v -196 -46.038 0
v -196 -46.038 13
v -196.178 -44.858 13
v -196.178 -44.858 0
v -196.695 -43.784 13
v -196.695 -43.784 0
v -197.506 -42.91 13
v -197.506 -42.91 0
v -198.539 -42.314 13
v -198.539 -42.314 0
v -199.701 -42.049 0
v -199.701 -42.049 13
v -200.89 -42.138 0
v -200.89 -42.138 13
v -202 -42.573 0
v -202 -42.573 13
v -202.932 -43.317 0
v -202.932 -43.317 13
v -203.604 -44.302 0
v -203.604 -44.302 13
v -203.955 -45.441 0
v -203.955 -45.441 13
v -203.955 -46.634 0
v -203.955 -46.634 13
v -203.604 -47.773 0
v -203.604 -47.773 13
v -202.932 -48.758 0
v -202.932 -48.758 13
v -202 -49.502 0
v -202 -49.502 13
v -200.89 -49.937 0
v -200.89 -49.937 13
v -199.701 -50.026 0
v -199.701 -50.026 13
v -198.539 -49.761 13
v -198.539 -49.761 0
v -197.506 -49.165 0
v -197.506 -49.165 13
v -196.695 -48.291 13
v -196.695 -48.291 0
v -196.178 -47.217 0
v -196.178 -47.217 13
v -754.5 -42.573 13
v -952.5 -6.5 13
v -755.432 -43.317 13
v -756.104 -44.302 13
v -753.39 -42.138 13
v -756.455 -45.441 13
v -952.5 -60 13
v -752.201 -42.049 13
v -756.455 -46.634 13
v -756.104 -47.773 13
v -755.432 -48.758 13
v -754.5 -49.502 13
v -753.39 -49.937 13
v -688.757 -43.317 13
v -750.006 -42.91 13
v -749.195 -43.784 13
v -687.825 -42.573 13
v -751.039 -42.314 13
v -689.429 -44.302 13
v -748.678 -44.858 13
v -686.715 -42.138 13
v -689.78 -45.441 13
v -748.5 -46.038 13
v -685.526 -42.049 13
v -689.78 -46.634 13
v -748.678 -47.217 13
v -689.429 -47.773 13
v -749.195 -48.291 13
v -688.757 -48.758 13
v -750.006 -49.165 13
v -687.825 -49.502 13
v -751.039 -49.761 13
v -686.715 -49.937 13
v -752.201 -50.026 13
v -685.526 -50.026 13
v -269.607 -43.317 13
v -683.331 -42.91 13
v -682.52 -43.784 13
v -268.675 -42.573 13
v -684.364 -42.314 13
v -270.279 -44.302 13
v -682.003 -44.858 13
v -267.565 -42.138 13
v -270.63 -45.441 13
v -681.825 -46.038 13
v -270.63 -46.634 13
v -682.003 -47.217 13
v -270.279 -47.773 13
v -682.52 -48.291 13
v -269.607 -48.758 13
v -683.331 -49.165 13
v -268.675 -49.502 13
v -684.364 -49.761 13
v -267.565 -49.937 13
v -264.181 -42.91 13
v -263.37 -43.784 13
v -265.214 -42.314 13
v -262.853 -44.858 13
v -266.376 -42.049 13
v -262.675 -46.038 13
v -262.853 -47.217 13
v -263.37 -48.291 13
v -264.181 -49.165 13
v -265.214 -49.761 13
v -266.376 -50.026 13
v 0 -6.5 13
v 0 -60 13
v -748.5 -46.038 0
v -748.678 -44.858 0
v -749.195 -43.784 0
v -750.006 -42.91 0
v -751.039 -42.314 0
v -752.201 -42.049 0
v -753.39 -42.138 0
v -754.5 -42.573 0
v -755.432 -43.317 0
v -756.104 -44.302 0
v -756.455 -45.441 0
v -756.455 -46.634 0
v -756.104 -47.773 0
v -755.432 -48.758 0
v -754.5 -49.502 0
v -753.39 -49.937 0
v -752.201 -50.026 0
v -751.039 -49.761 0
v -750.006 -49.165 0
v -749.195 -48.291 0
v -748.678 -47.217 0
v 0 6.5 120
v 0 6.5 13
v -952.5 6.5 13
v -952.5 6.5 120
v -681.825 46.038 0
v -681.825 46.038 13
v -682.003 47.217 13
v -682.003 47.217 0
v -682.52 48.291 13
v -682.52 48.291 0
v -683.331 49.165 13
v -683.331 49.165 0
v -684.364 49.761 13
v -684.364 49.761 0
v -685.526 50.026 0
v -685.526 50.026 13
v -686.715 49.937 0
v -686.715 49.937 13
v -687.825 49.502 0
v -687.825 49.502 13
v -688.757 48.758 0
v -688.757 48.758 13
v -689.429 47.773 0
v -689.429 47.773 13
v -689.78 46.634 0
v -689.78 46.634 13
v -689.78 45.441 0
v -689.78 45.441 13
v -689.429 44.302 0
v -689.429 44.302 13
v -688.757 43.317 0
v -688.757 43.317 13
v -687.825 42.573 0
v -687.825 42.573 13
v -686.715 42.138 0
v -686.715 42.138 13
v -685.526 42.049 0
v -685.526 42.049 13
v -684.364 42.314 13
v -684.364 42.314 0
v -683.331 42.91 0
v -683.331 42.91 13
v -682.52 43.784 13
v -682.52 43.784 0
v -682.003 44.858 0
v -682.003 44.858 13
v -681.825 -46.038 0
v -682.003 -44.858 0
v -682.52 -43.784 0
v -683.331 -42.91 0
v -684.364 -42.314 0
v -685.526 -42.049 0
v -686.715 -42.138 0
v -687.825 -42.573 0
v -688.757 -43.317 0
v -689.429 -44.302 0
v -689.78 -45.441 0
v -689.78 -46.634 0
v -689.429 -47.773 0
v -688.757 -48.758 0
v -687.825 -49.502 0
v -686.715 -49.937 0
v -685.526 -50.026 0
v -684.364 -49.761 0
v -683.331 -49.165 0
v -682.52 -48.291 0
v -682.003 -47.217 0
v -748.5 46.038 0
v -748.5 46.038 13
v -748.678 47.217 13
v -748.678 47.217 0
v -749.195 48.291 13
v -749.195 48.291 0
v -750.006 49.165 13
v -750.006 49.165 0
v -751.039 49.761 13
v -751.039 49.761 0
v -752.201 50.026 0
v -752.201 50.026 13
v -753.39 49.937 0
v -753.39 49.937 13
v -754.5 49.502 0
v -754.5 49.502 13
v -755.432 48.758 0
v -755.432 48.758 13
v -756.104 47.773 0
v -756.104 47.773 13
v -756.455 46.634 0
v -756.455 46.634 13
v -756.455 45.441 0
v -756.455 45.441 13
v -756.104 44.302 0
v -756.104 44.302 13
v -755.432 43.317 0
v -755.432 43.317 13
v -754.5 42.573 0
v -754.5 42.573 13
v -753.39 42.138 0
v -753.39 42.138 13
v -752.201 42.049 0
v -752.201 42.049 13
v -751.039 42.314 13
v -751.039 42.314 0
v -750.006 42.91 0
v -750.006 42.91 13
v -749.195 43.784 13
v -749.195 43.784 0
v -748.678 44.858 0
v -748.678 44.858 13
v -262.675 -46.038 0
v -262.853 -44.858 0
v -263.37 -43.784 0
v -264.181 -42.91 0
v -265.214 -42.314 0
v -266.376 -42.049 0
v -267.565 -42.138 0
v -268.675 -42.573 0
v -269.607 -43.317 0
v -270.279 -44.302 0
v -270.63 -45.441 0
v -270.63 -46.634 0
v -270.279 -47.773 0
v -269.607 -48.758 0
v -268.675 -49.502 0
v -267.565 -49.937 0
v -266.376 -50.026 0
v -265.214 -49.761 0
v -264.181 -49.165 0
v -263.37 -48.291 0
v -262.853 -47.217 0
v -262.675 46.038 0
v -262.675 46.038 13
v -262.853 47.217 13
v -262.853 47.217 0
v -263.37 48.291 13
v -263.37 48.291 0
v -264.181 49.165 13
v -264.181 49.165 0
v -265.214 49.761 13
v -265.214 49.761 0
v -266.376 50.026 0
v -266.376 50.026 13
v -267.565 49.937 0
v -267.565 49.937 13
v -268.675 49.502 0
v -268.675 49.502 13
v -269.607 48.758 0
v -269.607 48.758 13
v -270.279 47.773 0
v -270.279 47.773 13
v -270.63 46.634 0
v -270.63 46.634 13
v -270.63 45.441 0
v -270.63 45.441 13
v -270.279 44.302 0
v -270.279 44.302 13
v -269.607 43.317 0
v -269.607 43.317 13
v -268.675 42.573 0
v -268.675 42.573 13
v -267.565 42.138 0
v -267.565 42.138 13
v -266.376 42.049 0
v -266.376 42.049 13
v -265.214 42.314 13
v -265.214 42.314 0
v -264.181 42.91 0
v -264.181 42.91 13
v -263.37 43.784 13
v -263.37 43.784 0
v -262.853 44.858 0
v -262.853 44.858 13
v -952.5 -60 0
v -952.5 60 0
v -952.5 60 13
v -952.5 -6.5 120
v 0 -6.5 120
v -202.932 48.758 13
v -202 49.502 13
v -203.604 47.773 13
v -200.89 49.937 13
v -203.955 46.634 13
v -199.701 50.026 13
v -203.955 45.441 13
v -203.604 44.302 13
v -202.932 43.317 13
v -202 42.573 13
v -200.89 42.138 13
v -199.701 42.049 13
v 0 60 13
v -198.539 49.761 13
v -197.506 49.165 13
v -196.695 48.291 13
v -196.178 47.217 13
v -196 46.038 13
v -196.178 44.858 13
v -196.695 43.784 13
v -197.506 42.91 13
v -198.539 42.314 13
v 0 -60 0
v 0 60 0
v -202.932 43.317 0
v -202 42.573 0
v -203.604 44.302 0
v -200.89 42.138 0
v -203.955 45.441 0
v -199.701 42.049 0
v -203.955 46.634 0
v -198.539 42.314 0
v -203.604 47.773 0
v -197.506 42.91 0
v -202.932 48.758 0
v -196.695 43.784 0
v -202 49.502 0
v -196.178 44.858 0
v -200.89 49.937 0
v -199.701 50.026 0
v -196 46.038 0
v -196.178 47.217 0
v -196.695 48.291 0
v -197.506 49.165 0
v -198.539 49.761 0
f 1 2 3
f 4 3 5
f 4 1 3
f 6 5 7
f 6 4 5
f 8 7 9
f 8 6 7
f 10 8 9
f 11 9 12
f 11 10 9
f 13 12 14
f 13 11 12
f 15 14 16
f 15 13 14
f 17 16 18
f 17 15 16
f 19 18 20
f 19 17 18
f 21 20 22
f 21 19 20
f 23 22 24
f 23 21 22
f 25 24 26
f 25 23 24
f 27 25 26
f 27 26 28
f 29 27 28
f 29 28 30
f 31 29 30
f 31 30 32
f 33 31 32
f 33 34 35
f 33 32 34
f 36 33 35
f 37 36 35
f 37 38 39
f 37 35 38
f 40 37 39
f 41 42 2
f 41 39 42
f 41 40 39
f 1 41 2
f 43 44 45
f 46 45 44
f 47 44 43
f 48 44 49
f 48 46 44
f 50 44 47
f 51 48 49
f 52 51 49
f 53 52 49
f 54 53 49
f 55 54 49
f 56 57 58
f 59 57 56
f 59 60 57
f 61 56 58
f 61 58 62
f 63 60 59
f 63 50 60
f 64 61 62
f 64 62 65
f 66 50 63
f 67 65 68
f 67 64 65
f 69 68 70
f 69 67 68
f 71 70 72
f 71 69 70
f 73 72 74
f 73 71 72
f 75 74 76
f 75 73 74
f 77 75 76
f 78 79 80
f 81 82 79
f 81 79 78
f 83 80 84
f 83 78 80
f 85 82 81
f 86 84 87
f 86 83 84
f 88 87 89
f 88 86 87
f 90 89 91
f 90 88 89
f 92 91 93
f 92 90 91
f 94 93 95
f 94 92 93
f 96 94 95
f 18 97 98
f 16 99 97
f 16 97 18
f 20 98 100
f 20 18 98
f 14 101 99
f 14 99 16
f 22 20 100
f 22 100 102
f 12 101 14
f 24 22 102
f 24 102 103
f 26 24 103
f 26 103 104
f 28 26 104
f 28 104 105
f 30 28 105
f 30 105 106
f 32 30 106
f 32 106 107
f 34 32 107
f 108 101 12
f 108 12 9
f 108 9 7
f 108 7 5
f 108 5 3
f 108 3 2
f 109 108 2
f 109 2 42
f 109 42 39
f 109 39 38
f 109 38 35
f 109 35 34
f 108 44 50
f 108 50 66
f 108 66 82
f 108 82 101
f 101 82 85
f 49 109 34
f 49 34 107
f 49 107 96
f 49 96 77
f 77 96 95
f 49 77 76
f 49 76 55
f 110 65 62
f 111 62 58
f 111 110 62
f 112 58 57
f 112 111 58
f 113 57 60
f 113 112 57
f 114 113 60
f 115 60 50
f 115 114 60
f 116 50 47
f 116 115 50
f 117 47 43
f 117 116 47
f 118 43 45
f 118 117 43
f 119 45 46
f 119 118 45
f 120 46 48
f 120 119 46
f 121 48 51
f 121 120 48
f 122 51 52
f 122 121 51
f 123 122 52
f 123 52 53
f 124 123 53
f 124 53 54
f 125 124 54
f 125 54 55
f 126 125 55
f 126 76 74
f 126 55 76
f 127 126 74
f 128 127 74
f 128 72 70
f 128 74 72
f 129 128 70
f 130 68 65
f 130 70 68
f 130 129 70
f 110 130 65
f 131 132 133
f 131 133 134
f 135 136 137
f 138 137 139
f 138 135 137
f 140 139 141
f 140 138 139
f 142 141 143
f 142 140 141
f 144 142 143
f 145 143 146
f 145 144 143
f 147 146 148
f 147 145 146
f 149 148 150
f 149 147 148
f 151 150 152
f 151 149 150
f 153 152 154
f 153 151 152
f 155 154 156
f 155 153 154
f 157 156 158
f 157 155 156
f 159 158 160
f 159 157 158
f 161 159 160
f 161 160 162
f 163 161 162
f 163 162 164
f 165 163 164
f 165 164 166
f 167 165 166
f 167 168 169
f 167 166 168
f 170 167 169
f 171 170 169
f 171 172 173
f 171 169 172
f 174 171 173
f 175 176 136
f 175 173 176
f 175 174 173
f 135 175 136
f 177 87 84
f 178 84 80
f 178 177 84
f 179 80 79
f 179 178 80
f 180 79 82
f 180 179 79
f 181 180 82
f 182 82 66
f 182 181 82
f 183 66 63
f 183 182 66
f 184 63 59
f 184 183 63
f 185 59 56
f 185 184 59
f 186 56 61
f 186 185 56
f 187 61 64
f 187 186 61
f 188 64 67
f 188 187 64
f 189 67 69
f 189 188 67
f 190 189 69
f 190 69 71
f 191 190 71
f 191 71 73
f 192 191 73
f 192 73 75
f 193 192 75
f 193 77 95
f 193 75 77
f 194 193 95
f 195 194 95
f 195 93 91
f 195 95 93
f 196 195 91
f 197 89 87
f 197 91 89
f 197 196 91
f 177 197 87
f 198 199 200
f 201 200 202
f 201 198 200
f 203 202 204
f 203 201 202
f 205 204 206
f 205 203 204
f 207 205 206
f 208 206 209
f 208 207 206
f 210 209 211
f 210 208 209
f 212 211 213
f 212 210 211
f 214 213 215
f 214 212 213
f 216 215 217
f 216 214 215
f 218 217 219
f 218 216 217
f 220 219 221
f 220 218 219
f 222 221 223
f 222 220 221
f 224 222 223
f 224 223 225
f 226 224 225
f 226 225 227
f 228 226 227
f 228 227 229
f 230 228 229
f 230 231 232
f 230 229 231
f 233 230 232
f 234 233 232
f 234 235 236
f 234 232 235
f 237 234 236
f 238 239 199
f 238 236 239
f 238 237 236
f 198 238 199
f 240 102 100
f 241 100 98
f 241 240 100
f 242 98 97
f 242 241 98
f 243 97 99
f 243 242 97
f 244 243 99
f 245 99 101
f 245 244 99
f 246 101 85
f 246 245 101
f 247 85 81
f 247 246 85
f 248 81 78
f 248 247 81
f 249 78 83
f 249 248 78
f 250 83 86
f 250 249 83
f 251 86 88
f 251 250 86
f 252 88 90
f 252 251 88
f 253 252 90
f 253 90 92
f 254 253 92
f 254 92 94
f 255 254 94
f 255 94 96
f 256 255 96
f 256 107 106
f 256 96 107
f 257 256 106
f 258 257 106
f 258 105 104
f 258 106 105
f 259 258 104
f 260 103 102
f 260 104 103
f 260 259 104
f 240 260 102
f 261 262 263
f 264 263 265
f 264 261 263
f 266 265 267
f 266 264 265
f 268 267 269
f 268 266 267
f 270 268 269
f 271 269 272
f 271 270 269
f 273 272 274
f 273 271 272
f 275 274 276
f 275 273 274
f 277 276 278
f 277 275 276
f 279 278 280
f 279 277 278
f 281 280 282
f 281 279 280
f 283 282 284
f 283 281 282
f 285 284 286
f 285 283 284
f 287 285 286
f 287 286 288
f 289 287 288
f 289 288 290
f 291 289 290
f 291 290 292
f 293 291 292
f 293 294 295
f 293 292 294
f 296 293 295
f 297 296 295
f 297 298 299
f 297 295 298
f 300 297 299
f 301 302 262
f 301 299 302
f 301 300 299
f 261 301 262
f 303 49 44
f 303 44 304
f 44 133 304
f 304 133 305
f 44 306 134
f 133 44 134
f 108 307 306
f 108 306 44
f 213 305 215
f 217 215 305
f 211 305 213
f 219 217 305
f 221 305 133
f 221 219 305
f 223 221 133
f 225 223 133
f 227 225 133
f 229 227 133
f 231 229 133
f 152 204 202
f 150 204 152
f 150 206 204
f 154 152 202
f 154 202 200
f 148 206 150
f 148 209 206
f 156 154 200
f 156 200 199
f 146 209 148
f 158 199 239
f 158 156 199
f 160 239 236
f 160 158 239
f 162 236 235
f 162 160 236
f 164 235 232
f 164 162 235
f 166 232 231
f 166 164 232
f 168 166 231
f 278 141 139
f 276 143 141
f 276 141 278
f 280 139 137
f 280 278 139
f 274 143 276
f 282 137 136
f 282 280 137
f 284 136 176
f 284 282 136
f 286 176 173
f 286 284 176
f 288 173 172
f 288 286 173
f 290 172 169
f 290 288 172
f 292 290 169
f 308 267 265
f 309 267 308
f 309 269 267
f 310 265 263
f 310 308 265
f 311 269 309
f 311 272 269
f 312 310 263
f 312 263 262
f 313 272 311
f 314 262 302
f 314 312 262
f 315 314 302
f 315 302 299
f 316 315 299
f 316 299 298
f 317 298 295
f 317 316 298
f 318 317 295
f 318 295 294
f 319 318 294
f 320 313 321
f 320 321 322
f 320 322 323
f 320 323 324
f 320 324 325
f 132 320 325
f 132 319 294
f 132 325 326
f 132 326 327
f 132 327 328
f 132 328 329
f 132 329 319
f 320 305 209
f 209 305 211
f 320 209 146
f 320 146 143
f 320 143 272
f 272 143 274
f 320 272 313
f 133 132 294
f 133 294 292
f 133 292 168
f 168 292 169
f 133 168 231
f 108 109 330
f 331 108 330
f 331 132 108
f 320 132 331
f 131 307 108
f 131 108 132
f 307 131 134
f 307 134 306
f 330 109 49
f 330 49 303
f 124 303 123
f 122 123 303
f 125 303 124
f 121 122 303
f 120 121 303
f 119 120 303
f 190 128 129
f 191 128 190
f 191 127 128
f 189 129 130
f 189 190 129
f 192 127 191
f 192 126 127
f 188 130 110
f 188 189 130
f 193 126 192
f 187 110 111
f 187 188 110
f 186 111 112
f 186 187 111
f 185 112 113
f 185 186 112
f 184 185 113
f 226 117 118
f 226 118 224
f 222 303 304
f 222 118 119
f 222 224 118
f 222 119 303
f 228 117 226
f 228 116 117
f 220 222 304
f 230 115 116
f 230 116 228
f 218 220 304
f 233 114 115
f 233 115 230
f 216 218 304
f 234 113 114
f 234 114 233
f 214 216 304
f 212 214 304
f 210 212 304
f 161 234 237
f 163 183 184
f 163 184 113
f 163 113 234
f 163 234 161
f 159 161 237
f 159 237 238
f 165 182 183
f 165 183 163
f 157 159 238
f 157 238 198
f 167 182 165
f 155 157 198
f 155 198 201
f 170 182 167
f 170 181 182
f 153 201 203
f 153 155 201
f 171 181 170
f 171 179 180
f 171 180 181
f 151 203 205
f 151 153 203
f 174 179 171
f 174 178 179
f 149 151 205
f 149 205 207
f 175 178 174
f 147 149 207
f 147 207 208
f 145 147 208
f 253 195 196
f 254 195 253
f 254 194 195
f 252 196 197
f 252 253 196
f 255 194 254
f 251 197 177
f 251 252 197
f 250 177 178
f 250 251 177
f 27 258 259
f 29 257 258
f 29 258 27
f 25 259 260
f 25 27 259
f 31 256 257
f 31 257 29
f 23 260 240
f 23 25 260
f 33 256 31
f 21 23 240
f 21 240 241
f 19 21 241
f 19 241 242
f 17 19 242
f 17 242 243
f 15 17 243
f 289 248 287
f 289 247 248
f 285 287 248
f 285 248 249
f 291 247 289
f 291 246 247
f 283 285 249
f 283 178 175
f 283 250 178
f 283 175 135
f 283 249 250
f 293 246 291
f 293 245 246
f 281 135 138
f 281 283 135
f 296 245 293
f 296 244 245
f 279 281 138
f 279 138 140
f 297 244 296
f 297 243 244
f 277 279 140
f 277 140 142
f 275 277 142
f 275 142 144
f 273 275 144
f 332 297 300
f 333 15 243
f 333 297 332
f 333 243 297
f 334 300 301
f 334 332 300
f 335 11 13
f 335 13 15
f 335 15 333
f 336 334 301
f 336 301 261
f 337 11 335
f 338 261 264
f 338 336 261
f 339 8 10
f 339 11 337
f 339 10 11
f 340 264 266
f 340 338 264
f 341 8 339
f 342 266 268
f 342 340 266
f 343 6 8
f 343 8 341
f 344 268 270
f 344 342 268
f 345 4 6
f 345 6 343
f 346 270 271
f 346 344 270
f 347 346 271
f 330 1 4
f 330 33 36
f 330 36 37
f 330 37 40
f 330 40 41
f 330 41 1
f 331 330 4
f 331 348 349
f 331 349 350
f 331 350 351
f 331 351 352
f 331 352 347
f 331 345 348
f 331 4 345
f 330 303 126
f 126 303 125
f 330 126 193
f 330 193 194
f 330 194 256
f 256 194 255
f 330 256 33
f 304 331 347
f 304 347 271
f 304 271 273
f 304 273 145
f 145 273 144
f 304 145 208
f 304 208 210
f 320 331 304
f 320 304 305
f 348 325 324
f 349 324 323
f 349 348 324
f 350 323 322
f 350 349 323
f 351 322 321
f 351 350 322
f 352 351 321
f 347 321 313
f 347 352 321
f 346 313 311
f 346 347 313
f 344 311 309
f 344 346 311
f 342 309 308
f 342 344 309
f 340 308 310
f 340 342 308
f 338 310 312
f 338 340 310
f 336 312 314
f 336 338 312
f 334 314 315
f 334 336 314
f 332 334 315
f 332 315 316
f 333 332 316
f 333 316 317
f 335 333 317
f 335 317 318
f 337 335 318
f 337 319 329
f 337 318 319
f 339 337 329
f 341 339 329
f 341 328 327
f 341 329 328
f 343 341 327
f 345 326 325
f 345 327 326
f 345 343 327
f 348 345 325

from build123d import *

# Parameters (mm, degrees)
F1_DEPTH = 952.5
F2_R     = 4
F3_DEPTH = 120.001


with BuildPart() as f1:
    # F0 (on Right) → F1 (new body)
    with BuildSketch(Plane.YZ):
        Polygon((-60, 13), (-60, 0), (60, 0), (60, 13), (6.5, 13), (6.5, 120), (-6.5, 120), (-6.5, 13), align=None)
    extrude(amount=-F1_DEPTH)

    # F2 (on Top) → F3 (cut, through all)
    with BuildSketch(Plane.XY):
        with Locations((-200, -46.0375)):
            Circle(F2_R)
        with Locations((-200, 46.0375)):
            Circle(F2_R)
        with Locations((-266.675, 46.0375)):
            Circle(F2_R)
        with Locations((-266.675, -46.0375)):
            Circle(F2_R)
        with Locations((-752.5, -46.0375)):
            Circle(F2_R)
        with Locations((-685.825, -46.0375)):
            Circle(F2_R)
        with Locations((-685.825, 46.0375)):
            Circle(F2_R)
        with Locations((-752.5, 46.0375)):
            Circle(F2_R)
    extrude(amount=F3_DEPTH, mode=Mode.SUBTRACT)


solid = f1.part
